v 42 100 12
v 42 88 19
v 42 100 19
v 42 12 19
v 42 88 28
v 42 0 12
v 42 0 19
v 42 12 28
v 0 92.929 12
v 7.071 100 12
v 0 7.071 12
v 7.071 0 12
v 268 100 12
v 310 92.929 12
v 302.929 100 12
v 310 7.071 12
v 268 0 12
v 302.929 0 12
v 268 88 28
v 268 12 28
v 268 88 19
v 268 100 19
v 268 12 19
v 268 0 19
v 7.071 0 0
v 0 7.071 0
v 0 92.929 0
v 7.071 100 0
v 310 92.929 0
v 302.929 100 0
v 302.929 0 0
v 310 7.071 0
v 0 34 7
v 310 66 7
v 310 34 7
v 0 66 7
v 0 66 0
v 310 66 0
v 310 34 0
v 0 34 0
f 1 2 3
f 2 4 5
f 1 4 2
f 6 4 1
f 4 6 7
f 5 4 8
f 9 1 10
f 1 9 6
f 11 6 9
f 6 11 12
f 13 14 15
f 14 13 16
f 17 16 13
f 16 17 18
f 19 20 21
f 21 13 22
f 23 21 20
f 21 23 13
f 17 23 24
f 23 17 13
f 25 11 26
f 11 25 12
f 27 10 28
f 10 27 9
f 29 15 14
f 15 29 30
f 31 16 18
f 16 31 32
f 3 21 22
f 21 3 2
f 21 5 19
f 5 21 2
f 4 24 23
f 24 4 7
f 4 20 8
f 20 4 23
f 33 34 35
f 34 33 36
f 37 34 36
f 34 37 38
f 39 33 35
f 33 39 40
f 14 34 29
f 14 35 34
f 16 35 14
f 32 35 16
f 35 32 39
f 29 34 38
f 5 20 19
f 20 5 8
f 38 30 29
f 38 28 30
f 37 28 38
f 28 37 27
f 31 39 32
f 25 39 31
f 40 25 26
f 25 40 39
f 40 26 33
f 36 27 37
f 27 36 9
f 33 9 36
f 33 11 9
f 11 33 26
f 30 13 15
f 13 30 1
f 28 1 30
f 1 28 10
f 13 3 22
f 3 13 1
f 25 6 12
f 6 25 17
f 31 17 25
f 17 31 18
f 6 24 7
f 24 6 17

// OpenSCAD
include <../src/wardrobe.scad>;
plank_zx_rear_middle();
//github_openscad -o wardrobe_2/plank_zx_rear_middle.stl -D wardrobe_n=2 -D cutting_edge=0 -D break_view_length=0 wardrobe_2/plank_zx_rear_middle_stl.scad
